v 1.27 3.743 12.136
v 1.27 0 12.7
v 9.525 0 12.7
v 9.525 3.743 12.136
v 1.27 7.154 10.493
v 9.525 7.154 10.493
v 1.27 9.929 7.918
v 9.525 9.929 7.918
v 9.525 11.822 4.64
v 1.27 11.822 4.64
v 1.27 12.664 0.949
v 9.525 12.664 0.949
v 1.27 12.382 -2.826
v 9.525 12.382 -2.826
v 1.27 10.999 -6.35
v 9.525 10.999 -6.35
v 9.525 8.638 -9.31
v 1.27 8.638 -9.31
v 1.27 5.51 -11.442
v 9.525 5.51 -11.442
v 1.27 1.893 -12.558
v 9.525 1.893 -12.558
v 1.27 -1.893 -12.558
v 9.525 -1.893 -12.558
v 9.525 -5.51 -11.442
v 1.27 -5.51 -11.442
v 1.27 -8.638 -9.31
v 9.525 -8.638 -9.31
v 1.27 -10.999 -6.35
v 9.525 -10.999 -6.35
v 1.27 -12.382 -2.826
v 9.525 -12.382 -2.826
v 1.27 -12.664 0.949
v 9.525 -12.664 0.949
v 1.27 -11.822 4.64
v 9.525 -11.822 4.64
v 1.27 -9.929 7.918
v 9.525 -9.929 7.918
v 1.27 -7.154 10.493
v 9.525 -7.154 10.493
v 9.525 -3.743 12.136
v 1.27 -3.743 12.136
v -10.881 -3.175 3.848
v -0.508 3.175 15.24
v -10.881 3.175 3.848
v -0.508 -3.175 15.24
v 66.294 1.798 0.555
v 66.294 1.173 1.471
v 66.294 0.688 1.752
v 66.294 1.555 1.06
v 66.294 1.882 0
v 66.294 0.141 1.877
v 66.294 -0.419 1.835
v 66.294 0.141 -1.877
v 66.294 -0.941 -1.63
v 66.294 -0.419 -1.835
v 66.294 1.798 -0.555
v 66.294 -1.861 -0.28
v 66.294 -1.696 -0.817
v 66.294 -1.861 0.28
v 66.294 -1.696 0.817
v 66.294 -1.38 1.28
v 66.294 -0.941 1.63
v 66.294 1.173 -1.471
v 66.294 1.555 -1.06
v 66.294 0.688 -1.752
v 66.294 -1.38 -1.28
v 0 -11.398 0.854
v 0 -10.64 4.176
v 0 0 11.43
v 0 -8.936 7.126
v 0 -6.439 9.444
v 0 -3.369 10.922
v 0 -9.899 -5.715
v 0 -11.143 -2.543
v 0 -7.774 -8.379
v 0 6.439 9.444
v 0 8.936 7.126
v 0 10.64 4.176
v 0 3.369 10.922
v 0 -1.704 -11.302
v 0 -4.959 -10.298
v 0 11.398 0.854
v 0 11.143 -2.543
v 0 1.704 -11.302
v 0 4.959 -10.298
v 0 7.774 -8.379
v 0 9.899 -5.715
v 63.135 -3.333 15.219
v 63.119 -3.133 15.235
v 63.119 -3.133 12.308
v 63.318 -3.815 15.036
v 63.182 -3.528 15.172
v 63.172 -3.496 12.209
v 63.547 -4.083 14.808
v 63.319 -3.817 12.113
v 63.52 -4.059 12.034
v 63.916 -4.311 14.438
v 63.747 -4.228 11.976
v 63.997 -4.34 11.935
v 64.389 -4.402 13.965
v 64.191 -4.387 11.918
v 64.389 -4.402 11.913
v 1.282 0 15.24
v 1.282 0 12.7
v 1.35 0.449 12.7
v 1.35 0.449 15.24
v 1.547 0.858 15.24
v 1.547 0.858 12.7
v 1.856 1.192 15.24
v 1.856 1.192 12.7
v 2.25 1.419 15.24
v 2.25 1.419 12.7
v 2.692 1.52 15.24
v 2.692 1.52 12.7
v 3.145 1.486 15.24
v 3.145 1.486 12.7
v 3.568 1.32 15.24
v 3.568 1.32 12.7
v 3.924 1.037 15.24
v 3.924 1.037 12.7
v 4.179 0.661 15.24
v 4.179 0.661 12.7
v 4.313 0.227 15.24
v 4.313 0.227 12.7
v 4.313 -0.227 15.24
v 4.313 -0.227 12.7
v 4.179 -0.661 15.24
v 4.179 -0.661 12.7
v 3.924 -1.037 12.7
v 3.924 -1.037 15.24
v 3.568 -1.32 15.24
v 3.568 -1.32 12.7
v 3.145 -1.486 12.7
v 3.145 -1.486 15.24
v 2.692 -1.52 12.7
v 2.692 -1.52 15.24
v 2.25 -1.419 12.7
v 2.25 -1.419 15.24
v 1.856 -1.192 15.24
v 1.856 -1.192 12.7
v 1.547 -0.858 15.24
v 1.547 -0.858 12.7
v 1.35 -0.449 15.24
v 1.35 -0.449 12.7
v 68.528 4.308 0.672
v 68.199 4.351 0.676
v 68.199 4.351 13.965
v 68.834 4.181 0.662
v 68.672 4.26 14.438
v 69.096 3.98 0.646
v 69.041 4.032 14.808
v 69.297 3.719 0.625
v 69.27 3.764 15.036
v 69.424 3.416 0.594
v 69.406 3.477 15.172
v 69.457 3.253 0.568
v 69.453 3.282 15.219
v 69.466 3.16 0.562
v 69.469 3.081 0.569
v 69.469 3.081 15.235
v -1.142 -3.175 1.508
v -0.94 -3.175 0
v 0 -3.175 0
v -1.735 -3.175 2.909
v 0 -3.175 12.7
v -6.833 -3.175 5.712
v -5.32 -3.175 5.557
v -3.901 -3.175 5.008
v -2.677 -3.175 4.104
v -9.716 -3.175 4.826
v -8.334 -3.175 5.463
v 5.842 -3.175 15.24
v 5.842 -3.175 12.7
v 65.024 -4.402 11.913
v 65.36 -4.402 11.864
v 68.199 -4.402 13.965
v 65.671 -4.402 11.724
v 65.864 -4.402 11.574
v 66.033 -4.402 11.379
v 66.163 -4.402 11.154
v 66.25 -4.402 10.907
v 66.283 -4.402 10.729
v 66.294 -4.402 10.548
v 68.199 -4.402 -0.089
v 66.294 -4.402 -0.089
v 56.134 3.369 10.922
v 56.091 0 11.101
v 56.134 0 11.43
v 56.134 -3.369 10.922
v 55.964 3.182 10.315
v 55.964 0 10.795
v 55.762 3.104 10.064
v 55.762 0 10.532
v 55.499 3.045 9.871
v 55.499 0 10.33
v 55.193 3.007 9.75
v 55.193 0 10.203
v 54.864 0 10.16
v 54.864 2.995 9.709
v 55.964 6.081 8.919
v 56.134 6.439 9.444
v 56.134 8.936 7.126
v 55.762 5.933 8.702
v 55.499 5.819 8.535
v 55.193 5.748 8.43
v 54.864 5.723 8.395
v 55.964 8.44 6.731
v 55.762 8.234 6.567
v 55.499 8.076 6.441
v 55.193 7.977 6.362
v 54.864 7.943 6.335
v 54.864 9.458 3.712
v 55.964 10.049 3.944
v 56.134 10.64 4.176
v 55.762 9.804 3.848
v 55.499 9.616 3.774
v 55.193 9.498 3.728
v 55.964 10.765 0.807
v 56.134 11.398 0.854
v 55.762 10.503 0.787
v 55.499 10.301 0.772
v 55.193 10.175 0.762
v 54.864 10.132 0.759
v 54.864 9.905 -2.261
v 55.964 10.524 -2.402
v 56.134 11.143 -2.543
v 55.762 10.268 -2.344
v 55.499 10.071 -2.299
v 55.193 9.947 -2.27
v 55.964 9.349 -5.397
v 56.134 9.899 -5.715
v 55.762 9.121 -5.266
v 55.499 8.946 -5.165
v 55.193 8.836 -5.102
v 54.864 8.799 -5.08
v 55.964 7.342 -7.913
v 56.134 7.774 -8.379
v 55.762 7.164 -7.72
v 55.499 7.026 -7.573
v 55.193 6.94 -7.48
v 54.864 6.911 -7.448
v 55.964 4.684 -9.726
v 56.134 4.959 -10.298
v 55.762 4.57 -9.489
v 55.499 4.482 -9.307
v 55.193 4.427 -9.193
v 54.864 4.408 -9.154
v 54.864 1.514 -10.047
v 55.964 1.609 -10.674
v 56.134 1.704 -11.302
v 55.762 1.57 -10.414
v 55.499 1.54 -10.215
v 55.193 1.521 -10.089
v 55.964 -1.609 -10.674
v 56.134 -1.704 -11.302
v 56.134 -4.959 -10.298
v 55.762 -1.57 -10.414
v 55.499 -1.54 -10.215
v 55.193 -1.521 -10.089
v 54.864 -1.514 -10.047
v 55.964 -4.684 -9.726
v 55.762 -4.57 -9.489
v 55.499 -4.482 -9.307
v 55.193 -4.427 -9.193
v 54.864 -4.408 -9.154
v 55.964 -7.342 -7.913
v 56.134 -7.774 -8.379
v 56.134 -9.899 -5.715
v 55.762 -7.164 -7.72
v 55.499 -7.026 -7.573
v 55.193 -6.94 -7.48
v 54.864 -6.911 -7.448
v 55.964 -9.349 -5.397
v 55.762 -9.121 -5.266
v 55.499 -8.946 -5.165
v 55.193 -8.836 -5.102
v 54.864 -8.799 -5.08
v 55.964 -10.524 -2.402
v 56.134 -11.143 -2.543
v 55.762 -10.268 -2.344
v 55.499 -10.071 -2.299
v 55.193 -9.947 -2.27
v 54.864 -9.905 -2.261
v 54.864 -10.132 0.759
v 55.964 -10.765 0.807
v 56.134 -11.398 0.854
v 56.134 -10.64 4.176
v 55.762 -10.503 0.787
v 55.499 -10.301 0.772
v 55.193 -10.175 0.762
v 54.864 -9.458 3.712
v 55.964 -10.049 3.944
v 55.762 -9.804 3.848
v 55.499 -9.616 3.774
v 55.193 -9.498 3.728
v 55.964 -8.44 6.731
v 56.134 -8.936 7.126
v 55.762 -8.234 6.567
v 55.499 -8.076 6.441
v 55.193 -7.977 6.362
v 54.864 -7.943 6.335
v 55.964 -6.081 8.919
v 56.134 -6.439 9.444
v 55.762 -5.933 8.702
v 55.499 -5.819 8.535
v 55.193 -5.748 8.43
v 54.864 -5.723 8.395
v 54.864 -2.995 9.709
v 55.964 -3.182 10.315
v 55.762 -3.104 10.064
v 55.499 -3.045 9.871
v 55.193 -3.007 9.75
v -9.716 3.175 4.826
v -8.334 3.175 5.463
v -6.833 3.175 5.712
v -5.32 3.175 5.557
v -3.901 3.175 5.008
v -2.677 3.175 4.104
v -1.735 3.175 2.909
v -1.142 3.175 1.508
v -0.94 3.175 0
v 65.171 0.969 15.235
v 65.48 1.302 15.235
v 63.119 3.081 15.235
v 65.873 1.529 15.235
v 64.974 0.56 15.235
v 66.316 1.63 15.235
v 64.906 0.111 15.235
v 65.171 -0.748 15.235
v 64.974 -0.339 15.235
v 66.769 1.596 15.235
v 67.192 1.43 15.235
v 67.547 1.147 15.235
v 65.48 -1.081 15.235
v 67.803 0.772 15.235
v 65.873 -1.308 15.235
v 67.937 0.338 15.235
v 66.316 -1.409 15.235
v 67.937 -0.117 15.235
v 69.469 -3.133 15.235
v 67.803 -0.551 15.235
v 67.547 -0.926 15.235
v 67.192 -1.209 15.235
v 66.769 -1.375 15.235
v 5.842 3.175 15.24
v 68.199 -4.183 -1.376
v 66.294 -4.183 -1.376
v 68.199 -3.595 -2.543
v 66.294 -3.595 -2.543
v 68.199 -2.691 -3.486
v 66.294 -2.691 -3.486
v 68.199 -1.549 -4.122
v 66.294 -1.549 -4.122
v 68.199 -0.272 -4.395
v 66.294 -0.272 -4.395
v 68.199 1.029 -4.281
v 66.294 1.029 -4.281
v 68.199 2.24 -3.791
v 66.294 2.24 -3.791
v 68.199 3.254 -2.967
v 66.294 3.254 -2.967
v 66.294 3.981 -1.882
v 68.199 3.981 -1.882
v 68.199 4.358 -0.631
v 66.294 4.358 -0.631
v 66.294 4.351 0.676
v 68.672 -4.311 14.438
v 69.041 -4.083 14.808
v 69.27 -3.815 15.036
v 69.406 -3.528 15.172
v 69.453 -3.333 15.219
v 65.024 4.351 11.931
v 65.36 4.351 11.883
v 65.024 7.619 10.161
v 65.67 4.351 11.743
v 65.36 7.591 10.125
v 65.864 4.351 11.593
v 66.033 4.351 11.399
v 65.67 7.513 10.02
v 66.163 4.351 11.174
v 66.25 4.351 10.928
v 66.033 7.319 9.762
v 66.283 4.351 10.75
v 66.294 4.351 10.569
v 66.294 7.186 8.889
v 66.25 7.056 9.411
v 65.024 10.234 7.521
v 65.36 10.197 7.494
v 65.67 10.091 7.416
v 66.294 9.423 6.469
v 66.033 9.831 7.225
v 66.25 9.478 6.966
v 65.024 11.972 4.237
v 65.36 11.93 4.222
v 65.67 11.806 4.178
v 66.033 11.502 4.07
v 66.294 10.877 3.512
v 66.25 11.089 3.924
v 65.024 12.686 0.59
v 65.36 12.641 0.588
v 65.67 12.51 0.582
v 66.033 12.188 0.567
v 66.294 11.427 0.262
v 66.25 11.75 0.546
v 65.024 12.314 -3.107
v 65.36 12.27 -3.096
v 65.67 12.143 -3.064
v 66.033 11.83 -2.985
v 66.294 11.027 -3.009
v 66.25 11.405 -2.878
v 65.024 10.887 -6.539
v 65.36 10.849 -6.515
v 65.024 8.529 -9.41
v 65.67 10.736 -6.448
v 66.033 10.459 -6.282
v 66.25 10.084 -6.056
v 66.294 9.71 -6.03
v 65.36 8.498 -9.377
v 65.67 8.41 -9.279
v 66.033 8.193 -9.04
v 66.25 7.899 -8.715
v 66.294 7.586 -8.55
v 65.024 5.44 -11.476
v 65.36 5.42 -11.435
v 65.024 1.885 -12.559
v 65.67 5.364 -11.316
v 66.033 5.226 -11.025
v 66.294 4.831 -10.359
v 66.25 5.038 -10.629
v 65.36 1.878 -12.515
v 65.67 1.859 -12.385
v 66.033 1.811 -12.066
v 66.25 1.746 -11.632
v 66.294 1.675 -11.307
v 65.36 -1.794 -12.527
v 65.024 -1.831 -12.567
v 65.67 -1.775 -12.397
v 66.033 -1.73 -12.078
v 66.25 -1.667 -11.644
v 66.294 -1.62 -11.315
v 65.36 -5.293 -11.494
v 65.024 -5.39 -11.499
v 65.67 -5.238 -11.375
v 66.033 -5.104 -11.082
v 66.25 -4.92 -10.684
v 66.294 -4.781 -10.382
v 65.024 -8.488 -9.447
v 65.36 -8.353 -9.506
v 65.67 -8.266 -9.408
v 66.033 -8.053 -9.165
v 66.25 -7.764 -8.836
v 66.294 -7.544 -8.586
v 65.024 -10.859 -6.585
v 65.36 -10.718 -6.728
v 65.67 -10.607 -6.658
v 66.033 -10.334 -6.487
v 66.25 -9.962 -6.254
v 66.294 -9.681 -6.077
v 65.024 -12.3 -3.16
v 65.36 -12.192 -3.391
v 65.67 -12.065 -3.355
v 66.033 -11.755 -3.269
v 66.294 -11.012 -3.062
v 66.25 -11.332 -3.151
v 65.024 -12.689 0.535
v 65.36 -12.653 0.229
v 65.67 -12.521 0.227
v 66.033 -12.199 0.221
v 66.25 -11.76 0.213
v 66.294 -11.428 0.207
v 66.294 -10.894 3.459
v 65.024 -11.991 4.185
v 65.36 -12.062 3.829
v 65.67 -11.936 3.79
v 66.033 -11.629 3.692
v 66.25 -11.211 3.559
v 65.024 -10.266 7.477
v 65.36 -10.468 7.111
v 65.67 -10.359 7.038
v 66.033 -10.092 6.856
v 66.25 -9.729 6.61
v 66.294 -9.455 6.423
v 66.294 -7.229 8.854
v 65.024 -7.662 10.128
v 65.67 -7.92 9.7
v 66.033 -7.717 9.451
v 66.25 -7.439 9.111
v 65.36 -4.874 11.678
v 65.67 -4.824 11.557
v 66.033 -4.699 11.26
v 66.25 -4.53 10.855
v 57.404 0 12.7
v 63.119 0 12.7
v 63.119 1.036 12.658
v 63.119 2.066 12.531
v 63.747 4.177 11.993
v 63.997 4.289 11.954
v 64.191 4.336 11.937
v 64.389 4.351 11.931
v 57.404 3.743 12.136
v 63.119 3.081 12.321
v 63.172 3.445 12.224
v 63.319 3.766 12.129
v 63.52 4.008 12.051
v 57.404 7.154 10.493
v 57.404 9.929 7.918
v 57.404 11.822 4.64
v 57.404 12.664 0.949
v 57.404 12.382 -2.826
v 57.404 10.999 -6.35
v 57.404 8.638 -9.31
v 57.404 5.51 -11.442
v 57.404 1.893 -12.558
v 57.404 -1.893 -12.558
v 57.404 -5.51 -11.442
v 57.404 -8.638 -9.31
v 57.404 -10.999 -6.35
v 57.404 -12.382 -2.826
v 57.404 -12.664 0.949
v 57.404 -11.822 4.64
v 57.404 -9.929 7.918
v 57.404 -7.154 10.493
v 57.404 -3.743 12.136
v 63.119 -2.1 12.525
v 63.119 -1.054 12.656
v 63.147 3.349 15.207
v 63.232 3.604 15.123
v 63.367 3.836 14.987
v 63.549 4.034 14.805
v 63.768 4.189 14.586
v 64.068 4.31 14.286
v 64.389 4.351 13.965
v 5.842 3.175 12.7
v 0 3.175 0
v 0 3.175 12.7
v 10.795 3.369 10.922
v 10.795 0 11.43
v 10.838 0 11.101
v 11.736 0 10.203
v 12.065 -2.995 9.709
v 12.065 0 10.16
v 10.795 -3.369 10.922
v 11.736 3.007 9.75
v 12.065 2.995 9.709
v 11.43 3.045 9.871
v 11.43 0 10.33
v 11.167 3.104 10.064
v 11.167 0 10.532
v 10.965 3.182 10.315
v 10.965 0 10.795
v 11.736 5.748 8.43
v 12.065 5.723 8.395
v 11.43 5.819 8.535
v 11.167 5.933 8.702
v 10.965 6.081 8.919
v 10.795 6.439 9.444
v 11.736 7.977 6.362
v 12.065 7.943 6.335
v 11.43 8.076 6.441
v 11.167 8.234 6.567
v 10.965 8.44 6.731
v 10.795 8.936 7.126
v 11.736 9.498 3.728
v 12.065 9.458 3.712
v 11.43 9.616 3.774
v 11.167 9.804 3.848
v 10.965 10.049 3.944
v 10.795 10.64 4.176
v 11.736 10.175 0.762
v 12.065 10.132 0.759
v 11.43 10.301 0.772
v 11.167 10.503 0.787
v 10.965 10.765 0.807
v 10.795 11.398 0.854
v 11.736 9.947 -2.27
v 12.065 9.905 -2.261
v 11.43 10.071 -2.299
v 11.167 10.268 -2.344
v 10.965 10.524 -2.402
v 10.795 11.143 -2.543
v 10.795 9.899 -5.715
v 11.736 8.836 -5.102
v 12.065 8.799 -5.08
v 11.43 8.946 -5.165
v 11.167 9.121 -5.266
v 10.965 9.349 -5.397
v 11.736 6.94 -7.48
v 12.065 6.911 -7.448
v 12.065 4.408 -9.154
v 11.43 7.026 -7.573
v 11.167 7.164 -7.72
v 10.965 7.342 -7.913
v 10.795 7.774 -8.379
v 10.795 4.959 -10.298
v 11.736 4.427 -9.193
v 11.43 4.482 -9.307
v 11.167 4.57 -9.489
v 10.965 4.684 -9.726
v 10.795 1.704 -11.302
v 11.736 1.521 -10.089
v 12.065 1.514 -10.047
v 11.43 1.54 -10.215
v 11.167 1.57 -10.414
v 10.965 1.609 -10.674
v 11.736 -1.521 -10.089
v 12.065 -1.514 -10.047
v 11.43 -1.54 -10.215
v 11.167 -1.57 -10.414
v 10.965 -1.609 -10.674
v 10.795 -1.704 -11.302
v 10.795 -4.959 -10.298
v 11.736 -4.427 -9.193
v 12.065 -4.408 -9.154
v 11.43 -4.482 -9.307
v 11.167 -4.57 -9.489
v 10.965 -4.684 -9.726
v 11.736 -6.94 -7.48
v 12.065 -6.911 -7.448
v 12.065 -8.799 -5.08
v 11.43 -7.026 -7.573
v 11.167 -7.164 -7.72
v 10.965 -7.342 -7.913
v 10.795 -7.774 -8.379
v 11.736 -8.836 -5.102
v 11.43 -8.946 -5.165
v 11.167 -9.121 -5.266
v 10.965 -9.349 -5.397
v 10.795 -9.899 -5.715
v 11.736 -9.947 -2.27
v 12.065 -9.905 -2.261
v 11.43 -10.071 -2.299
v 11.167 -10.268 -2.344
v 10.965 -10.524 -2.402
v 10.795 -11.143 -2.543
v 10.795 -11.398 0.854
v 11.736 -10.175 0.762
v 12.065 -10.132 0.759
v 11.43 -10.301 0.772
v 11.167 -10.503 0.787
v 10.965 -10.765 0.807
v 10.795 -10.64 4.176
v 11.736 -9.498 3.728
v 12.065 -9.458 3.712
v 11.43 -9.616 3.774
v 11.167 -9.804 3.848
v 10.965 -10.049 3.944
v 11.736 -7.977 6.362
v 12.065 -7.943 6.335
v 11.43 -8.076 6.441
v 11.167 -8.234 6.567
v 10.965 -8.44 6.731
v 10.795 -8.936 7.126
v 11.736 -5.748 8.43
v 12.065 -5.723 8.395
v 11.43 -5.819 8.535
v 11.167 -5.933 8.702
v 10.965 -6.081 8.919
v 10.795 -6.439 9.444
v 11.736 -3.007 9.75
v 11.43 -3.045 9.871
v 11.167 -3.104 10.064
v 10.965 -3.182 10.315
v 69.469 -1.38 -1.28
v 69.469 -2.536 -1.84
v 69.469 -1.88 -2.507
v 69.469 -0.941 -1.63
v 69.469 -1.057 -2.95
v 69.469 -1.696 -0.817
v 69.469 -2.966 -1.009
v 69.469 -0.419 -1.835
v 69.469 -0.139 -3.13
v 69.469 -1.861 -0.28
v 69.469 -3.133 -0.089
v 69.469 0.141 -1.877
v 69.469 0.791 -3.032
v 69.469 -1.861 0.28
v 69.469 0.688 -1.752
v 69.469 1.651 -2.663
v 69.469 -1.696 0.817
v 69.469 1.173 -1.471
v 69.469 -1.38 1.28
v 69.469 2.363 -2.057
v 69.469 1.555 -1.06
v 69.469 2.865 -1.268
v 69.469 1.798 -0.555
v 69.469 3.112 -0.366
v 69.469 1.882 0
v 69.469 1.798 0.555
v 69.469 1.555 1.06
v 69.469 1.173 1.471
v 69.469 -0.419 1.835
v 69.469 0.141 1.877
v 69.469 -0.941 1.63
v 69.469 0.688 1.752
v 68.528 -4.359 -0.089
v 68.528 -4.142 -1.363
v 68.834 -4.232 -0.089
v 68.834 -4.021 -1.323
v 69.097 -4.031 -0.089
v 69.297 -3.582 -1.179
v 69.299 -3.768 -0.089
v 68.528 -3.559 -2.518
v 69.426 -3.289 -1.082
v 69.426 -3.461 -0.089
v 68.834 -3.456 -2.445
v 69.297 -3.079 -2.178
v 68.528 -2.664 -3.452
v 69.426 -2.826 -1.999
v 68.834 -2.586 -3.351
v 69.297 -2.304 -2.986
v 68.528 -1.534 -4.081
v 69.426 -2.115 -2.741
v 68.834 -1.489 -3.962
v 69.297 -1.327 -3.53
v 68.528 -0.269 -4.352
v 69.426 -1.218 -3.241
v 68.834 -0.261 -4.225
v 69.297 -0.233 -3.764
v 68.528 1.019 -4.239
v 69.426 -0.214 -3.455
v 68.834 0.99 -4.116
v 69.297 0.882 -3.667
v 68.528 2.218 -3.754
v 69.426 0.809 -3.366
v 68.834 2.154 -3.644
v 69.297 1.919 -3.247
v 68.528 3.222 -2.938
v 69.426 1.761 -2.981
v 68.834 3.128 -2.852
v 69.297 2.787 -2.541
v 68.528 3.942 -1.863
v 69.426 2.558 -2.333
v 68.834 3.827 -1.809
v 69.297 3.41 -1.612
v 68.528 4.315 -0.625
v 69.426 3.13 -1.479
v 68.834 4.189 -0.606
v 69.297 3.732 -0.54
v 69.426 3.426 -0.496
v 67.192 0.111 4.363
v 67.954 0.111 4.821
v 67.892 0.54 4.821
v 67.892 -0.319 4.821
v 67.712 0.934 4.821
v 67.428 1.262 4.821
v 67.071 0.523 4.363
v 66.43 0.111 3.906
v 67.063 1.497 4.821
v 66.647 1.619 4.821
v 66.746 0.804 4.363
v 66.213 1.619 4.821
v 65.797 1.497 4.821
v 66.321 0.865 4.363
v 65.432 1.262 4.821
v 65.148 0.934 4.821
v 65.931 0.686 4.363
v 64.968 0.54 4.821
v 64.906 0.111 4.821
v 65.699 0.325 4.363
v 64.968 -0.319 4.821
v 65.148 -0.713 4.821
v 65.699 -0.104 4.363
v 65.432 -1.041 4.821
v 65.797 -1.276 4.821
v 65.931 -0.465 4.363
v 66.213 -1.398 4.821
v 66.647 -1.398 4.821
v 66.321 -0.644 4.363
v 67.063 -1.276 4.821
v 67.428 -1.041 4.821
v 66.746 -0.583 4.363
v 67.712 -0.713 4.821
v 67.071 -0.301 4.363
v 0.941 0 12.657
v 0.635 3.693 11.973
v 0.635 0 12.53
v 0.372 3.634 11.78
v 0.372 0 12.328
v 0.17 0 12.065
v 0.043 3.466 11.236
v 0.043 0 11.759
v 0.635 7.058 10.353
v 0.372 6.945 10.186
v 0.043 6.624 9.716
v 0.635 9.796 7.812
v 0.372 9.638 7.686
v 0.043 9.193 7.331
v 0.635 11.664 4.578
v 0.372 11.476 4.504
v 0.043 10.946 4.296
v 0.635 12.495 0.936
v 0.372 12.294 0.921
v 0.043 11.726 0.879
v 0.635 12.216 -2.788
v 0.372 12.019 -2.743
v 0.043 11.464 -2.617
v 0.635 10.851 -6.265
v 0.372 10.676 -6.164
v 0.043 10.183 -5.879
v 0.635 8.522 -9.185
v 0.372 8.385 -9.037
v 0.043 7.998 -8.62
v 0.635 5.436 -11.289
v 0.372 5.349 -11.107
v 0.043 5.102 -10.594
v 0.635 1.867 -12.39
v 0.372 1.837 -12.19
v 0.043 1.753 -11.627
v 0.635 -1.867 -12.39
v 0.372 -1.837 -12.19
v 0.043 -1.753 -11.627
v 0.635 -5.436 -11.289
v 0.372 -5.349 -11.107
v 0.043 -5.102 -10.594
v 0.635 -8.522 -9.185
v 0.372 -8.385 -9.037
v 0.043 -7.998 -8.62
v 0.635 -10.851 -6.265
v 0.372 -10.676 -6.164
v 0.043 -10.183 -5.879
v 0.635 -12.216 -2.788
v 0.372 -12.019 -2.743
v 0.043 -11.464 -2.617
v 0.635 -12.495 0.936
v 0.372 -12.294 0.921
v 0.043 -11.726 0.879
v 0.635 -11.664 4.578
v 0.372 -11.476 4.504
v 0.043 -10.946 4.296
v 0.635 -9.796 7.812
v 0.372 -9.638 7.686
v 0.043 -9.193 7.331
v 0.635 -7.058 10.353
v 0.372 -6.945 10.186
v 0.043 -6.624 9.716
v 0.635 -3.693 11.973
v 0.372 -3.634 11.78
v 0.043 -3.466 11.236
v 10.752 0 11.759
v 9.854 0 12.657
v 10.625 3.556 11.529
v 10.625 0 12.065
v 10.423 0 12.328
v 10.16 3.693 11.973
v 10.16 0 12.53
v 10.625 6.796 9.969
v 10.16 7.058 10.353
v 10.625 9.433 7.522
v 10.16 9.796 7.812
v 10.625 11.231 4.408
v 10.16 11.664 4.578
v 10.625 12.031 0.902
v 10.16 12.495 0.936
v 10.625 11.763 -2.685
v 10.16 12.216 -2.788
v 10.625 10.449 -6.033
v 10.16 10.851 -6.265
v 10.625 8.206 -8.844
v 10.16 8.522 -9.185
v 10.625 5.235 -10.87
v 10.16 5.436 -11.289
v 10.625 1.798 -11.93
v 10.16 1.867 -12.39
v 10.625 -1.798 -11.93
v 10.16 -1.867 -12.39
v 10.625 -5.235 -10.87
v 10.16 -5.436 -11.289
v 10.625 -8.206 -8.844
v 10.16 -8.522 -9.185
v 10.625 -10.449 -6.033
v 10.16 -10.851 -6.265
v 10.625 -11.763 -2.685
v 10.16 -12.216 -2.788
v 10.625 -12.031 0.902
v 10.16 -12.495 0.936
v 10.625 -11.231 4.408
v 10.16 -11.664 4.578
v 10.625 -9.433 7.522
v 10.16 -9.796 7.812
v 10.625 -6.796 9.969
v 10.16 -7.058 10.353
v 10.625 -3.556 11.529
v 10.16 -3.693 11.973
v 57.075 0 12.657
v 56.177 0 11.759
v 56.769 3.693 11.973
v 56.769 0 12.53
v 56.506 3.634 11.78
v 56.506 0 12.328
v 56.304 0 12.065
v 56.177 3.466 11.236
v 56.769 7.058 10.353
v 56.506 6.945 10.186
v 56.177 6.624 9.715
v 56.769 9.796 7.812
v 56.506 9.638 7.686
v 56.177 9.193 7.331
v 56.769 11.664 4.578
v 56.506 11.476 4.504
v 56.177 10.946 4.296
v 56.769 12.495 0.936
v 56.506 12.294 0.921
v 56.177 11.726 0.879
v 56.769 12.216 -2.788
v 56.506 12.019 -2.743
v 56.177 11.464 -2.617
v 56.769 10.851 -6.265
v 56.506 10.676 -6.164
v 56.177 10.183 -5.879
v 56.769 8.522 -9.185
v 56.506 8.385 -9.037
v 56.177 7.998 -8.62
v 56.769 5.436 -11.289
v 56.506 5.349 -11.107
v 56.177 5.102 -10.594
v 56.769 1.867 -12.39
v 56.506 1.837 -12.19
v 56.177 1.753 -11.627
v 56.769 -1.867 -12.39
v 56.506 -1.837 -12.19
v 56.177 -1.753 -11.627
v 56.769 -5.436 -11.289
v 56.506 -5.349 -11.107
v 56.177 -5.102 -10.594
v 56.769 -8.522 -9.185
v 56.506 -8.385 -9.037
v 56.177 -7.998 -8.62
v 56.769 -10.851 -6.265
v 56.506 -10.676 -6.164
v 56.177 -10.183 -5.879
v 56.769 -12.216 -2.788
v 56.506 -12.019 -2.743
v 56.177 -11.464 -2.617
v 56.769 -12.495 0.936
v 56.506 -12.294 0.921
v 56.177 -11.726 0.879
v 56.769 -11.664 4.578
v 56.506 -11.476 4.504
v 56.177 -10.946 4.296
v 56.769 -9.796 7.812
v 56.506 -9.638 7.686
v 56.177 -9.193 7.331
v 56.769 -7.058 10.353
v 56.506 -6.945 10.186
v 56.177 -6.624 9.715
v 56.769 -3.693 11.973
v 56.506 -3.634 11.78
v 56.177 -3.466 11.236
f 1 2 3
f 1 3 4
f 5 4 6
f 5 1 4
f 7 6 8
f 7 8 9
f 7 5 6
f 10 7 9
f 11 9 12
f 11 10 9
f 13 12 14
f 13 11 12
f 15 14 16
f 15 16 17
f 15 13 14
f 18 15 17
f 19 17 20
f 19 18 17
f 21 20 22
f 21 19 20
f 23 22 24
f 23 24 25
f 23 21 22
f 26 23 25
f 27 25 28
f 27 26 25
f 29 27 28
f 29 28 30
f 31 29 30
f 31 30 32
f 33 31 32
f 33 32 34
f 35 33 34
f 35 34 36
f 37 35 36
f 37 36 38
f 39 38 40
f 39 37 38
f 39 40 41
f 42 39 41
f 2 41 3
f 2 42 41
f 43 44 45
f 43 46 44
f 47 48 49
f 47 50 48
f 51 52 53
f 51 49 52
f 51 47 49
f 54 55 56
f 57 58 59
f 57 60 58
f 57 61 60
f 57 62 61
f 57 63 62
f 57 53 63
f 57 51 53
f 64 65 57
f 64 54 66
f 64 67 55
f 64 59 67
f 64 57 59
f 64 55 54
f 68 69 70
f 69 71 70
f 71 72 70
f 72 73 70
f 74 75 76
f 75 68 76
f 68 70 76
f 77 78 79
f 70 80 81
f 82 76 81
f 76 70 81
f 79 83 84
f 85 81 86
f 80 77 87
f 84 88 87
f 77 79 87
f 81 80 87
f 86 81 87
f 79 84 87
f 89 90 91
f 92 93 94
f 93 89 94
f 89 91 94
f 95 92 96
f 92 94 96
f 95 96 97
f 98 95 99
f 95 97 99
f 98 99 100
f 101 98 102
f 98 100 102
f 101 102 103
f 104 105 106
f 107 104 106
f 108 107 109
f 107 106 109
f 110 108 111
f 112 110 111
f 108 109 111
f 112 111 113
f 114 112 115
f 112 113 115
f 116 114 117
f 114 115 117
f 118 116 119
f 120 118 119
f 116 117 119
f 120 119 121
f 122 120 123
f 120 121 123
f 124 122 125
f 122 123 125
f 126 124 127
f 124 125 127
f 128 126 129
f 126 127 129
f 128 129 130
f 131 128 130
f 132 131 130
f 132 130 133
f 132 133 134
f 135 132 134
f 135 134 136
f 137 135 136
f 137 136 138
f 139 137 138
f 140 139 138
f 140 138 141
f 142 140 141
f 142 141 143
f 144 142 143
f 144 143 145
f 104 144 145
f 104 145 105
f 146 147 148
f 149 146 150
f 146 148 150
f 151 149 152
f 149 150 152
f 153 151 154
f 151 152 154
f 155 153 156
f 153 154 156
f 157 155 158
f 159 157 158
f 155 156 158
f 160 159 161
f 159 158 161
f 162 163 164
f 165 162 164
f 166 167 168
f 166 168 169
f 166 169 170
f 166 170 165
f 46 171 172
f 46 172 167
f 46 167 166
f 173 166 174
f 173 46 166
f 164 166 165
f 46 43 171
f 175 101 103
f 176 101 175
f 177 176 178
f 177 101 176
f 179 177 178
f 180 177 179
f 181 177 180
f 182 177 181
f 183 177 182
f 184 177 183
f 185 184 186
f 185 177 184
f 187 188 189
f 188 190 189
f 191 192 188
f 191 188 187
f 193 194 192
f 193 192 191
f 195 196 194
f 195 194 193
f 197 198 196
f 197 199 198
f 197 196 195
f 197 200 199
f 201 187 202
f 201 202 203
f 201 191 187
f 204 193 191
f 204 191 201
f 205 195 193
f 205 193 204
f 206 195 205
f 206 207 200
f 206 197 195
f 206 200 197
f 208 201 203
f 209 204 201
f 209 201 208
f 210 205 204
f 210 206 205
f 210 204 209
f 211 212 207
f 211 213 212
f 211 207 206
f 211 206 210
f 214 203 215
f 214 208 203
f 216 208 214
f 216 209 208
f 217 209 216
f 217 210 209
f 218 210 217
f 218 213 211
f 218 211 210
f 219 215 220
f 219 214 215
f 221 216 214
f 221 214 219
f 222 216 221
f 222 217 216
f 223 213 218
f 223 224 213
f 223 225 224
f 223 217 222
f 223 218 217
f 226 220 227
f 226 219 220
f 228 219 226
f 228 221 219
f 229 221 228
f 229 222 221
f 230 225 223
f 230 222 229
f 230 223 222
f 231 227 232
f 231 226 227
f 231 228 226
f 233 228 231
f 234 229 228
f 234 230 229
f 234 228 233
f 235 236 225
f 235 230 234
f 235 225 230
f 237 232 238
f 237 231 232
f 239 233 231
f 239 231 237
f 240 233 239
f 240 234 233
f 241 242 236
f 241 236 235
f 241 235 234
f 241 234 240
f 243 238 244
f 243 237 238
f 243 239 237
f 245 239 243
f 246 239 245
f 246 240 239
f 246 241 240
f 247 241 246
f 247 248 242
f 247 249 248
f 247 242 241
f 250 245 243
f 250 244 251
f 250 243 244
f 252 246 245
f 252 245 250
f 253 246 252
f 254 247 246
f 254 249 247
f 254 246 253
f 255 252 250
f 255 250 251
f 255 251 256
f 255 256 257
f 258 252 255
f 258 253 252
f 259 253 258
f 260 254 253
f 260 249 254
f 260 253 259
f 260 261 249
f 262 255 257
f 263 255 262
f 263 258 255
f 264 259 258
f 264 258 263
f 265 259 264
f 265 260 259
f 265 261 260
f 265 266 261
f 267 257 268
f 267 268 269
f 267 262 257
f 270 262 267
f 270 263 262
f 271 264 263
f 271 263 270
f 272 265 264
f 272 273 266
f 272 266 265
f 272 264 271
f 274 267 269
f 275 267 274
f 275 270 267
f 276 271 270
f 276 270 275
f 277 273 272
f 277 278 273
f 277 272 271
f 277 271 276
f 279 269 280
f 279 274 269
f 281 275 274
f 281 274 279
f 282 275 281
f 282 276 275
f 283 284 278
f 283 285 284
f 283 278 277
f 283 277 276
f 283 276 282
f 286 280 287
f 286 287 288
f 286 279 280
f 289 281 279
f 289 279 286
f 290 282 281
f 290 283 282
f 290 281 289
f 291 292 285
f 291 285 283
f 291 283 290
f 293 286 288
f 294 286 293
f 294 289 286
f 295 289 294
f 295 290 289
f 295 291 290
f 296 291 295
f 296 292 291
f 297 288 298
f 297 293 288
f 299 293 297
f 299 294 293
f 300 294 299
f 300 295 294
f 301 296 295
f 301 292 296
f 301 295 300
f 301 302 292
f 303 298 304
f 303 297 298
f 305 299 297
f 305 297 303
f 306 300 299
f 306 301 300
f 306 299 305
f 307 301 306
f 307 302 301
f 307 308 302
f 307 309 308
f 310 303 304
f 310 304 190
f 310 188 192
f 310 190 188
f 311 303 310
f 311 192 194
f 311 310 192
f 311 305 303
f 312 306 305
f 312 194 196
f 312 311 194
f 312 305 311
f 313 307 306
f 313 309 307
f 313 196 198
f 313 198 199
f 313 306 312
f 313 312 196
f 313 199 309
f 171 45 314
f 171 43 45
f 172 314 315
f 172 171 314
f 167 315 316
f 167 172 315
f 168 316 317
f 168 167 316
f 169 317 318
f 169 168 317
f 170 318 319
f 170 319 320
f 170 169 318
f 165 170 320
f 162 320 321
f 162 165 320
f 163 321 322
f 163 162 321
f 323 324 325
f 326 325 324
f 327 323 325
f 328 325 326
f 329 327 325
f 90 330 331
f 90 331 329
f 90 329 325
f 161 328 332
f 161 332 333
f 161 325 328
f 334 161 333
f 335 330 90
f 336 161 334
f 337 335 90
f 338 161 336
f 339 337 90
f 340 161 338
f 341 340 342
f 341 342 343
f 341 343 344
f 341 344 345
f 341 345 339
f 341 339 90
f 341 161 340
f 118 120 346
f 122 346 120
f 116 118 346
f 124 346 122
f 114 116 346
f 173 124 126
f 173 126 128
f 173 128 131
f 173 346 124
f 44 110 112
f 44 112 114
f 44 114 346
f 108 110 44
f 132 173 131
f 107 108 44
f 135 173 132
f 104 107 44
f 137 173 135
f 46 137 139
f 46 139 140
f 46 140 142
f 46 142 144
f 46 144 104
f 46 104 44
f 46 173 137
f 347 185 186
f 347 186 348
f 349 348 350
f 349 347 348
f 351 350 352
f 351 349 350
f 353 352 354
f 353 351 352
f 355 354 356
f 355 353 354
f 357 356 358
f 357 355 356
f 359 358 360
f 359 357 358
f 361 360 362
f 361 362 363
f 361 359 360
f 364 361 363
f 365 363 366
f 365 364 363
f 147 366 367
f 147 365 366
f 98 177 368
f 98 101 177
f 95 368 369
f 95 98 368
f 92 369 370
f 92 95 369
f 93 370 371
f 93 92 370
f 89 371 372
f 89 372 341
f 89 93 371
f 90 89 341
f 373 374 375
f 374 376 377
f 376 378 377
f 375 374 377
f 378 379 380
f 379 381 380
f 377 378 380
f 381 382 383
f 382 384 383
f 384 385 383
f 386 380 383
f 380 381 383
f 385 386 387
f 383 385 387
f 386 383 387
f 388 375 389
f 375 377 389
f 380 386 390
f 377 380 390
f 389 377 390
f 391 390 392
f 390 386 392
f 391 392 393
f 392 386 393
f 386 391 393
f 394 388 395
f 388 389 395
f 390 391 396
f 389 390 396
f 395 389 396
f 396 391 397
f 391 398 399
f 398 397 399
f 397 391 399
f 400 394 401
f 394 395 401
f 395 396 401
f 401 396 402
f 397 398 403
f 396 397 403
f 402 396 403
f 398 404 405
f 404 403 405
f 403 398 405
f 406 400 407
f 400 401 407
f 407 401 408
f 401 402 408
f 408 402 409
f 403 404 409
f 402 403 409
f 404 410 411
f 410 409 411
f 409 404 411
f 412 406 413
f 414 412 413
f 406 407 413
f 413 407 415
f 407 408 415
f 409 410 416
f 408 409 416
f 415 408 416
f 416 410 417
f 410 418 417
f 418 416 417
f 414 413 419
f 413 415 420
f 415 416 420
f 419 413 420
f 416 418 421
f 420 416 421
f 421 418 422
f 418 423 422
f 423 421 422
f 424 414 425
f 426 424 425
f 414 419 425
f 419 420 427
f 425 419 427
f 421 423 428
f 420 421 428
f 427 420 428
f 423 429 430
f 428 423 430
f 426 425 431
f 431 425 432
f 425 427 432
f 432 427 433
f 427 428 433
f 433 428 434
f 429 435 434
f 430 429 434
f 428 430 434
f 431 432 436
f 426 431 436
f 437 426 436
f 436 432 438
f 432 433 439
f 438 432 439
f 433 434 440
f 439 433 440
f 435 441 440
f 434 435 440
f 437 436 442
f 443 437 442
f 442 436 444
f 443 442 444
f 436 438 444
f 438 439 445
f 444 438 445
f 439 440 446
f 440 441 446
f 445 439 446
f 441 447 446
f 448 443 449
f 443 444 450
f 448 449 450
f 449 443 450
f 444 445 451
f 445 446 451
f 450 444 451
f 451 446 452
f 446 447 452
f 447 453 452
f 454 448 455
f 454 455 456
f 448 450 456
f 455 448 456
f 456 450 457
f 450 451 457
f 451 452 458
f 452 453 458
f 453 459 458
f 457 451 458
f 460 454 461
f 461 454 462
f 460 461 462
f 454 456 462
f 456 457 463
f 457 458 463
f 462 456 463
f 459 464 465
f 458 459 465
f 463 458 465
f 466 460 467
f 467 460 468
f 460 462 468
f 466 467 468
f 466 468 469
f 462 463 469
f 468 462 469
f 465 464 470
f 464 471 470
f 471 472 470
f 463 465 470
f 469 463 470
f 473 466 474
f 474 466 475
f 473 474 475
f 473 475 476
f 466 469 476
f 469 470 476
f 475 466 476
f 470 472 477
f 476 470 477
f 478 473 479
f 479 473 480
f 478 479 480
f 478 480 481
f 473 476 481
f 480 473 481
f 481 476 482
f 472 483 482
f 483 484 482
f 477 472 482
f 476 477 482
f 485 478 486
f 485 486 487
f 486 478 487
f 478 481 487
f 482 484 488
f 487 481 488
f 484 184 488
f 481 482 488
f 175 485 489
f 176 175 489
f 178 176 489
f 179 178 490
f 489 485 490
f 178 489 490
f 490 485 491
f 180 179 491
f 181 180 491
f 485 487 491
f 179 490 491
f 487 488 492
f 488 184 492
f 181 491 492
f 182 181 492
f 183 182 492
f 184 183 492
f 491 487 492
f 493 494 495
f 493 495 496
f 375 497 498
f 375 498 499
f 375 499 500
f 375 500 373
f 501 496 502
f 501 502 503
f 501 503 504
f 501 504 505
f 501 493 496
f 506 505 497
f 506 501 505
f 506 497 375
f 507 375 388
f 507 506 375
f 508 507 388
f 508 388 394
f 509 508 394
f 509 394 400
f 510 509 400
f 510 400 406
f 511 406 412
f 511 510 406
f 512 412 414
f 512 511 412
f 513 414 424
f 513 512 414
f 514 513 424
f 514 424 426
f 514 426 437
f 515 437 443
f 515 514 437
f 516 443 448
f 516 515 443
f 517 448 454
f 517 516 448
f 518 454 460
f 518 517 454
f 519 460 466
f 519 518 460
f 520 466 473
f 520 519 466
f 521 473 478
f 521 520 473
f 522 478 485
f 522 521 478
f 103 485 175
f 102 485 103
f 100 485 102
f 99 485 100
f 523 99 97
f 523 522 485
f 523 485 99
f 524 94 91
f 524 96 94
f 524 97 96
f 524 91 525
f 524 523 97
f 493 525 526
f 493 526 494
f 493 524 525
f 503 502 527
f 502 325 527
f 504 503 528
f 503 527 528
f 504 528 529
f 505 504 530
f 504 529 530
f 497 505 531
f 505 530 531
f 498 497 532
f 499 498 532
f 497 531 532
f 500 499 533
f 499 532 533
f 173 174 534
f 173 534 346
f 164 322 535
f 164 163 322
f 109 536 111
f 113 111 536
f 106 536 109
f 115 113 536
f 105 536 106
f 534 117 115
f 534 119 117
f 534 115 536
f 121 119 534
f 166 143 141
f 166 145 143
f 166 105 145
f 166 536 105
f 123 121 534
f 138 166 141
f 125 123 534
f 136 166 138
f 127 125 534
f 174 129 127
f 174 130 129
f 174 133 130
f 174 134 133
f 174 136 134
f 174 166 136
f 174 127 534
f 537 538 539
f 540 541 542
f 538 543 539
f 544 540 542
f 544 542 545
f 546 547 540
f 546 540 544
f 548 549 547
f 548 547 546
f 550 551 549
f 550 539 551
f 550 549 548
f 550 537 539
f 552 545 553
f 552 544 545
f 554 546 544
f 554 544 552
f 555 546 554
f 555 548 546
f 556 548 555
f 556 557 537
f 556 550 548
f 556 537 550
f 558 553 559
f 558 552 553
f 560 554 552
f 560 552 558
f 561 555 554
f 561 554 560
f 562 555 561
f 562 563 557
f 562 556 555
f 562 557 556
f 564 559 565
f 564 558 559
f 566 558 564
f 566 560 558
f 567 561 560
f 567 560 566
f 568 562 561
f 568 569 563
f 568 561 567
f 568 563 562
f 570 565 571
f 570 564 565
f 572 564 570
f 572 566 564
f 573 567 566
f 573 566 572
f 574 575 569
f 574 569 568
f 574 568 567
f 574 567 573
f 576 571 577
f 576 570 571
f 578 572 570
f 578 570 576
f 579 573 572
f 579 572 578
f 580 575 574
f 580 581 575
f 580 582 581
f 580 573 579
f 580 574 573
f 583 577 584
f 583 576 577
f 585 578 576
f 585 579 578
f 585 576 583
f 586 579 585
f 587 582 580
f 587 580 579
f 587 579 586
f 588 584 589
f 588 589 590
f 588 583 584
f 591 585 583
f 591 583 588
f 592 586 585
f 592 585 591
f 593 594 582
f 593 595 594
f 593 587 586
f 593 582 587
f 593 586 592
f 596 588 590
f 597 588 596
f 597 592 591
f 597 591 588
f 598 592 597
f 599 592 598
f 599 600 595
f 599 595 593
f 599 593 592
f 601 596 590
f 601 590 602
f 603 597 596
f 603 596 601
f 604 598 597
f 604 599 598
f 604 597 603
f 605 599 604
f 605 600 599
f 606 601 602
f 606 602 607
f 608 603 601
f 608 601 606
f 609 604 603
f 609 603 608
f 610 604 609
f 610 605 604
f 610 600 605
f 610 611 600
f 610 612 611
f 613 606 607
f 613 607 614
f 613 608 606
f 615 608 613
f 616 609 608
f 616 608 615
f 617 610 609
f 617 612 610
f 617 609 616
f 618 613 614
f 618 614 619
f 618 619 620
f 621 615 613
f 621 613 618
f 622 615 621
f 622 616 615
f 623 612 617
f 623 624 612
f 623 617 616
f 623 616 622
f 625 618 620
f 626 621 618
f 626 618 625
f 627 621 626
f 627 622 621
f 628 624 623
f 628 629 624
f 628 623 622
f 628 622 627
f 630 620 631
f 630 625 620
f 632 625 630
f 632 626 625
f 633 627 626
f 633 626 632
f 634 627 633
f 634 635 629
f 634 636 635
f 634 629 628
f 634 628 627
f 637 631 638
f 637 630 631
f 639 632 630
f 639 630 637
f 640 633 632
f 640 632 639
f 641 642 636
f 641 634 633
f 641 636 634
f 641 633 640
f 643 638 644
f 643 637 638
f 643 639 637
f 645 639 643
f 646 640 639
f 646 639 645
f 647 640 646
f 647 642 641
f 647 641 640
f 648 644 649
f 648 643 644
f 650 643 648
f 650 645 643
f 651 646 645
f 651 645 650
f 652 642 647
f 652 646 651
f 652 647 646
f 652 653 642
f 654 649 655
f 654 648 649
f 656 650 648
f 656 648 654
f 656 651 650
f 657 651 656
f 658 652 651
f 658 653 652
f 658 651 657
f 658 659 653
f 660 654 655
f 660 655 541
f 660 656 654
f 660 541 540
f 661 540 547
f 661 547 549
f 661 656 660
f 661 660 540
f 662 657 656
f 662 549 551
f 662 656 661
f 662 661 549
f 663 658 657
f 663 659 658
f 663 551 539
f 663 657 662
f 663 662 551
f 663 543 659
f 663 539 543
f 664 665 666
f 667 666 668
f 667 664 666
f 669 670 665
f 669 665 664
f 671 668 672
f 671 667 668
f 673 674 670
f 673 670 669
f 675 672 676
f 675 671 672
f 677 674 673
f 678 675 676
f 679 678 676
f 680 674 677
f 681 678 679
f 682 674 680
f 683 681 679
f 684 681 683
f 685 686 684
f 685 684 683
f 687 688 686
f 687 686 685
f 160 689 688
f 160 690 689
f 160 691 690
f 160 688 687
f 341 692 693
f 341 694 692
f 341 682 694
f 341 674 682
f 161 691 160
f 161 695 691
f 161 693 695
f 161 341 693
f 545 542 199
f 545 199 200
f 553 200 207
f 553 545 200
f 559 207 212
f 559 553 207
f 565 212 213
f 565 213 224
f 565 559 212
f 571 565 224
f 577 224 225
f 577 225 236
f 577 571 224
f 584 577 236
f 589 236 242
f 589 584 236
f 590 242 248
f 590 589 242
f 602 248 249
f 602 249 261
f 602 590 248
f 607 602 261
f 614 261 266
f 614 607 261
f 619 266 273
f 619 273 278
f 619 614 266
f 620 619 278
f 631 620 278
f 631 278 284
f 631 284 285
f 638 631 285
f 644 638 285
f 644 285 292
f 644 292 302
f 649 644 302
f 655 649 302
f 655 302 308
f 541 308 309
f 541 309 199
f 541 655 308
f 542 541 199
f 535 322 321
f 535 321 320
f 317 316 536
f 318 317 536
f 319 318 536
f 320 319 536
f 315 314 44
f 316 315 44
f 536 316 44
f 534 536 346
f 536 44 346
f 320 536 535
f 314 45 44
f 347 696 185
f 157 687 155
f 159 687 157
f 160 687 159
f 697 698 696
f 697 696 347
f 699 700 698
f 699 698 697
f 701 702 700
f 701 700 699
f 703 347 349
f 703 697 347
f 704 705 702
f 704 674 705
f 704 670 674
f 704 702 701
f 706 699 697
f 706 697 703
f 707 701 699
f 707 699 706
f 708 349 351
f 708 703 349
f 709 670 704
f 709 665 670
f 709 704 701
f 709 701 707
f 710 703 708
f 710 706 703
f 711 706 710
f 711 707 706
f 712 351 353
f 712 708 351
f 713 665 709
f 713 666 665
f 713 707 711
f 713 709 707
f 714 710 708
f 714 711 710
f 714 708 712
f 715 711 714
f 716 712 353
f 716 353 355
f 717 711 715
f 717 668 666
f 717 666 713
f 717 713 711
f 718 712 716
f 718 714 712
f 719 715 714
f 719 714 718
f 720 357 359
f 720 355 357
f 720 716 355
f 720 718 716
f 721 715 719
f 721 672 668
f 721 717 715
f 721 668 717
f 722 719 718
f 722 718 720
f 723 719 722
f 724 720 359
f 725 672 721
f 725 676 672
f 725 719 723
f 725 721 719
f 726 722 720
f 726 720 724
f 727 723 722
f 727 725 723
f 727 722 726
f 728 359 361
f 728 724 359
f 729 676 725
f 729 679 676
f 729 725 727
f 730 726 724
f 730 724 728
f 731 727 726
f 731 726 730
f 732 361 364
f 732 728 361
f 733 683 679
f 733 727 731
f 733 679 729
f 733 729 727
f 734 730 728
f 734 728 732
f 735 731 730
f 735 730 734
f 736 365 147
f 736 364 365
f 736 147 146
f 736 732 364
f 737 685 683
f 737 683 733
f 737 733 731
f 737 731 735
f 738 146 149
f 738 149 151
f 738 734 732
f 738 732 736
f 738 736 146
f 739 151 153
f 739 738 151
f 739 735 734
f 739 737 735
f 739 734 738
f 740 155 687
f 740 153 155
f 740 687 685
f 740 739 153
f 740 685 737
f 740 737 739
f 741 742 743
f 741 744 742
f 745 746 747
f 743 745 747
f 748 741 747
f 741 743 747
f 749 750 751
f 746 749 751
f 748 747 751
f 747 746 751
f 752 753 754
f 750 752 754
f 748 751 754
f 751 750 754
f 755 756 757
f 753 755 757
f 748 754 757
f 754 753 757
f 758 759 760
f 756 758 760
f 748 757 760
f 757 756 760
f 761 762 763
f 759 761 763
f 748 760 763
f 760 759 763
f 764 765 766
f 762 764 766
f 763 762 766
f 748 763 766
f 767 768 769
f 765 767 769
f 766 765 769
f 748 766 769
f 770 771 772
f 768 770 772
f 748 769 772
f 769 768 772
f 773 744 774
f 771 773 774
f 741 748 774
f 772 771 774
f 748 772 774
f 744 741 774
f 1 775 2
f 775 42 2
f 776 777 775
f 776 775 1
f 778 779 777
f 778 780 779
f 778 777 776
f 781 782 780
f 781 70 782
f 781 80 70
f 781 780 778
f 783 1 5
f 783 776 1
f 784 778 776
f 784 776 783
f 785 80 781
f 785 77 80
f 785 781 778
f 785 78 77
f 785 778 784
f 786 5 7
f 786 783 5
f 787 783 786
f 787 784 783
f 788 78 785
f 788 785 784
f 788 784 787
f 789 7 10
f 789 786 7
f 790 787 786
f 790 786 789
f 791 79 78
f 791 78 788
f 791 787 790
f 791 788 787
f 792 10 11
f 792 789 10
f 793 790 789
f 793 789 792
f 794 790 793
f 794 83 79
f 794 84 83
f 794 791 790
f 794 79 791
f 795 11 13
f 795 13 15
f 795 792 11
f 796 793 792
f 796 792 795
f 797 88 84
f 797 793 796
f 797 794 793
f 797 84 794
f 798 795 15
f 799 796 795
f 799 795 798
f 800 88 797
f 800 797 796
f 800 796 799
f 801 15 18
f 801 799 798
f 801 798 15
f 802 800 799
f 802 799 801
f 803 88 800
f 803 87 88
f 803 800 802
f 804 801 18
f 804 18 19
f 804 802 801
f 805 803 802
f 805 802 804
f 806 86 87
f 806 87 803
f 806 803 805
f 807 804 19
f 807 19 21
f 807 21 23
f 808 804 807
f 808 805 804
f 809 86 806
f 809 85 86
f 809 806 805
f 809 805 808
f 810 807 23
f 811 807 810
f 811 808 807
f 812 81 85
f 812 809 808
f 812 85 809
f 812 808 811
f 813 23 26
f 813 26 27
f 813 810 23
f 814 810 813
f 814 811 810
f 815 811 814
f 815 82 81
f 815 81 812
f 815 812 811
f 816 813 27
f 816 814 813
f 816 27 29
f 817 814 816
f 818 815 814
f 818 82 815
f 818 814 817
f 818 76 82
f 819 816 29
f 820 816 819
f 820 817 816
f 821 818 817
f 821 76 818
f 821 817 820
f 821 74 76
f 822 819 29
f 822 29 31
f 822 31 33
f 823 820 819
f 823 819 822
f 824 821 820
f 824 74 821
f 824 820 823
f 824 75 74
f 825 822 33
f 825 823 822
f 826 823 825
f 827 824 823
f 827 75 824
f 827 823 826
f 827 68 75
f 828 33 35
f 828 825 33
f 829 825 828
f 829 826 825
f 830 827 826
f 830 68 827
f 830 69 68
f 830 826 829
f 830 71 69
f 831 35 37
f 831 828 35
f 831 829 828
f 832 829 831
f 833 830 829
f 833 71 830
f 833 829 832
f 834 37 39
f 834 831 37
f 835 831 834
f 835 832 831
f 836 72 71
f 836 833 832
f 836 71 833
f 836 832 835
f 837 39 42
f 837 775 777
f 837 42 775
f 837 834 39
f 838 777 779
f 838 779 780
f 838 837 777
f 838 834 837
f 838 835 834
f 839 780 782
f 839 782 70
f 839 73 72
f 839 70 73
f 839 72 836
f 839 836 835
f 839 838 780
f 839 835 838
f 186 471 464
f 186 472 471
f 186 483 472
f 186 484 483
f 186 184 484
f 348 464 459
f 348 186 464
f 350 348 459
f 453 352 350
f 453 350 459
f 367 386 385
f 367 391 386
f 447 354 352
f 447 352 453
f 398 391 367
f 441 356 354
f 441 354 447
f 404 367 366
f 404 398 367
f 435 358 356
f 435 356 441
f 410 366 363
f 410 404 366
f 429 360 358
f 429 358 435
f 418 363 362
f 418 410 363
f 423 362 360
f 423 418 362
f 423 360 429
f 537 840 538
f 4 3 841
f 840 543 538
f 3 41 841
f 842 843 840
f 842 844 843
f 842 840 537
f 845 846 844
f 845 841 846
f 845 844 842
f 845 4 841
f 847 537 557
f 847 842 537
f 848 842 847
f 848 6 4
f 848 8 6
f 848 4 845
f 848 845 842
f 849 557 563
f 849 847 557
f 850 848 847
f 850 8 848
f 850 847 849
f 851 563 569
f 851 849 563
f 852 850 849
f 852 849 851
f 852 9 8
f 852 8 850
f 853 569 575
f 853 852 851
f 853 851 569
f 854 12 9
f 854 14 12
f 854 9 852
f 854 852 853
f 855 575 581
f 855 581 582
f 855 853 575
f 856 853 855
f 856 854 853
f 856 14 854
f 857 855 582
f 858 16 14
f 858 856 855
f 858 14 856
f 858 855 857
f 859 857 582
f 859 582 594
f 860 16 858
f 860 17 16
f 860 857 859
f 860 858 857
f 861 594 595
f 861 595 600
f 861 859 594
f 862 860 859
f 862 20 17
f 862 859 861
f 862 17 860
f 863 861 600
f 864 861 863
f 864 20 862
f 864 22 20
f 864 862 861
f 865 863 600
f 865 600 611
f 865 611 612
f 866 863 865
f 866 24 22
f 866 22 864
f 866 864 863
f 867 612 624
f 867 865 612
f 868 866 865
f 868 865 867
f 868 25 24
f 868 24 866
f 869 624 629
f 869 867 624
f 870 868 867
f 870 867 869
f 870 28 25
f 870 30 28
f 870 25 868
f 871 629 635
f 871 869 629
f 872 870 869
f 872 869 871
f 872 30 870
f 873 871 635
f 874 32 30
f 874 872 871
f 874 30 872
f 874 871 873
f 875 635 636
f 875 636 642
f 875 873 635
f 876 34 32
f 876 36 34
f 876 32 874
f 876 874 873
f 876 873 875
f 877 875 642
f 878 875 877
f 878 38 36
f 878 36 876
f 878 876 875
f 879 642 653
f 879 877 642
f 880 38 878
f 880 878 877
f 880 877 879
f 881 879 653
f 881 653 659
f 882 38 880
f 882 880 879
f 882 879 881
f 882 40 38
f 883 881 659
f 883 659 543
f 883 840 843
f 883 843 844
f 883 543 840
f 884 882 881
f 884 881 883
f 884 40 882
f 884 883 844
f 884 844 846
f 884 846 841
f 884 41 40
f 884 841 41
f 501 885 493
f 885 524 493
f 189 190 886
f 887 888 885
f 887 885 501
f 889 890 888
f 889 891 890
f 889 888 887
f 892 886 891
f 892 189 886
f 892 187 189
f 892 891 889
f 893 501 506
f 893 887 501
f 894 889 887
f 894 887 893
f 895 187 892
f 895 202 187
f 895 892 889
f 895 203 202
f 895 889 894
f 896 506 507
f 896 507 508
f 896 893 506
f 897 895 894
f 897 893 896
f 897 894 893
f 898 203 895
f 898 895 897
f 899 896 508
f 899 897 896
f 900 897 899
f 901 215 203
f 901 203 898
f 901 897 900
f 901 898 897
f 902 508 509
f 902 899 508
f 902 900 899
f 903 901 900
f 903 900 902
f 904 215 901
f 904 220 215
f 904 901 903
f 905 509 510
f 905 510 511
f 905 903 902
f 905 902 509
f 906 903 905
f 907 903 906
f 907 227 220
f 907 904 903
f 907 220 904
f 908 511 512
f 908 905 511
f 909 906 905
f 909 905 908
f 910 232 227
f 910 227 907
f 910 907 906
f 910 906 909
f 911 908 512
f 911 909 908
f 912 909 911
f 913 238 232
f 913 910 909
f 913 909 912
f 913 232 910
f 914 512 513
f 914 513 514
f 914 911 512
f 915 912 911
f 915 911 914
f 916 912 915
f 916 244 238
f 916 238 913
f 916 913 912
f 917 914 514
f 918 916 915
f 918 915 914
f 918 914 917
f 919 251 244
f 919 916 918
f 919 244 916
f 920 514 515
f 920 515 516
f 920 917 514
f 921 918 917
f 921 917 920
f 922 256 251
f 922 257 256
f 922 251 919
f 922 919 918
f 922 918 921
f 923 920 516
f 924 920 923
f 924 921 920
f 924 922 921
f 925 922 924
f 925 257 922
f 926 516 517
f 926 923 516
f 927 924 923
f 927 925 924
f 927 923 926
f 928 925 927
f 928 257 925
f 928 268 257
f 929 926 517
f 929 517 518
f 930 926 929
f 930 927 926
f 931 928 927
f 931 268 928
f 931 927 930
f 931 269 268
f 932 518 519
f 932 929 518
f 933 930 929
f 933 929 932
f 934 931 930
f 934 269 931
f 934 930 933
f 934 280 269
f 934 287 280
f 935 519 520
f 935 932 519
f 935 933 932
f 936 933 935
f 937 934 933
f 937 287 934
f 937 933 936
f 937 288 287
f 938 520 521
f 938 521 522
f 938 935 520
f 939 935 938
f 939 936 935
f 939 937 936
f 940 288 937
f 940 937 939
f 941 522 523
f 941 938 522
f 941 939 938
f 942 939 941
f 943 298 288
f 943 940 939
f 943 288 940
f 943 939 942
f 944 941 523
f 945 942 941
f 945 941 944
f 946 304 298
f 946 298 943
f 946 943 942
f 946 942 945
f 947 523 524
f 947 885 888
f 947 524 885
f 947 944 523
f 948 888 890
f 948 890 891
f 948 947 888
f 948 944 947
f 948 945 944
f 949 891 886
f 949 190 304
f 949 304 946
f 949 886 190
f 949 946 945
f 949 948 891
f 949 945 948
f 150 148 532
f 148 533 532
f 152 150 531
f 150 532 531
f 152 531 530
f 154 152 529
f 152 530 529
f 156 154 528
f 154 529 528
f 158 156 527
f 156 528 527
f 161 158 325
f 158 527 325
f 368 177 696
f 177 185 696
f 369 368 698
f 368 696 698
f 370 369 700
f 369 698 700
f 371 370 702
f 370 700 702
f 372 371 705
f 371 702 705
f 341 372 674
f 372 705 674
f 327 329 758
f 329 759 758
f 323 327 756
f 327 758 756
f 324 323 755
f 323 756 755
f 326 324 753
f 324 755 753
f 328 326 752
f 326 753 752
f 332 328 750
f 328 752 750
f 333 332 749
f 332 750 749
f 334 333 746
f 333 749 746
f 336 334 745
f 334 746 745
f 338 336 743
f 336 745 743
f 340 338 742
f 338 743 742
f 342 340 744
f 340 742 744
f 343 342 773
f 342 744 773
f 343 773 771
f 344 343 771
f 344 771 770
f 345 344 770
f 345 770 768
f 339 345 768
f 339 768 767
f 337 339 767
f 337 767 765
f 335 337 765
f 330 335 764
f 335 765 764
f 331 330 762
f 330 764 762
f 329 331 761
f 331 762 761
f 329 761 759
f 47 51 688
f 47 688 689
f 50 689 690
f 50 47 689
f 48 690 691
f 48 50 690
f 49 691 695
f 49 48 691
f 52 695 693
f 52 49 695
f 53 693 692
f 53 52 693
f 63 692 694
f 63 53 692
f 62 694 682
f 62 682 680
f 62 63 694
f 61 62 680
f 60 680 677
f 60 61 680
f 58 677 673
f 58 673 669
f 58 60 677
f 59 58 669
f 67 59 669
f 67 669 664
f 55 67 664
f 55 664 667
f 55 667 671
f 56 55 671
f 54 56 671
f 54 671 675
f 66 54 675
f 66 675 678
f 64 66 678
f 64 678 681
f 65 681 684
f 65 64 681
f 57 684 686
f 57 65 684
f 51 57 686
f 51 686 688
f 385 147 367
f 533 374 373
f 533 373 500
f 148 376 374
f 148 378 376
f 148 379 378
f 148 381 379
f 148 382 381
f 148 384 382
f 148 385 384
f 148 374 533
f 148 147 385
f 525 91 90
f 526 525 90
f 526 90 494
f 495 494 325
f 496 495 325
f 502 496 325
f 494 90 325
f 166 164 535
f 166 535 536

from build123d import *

# Parameters (mm, degrees)
F0_W     = 5.842
F0_H     = 12.7
F2_DEPTH = 3.175
F3_DEPTH = 0.635
F5_D     = 3.048
F5_DEPTH = 17.78
F5_TIP   = 0.9157115834
F6_R     = 1.8819905546
F7_DEPTH = 3.175
F9_D     = 3.048
F9_DEPTH = 10.414
F9_TIP   = 0.9157115834
F10_R    = 1.27
F11_R    = 1.26999


# Not quite as in the source:
# - two fillets or chamfers of one size are made in one step
# - a fillet or chamfer is up to 0.001 mm smaller than in the source, because OpenCascade refuses the exact size
# - a feature of the source that left no trace in its solid (it failed there, or was rolled back) is left out


with BuildPart() as f1:
    # F0 (on Front) → F1 (revolve)
    with BuildSketch(Plane.XZ):
        Polygon((5.842, 12.7), (5.842, 0), (66.294, 0), (66.294, 12.7), (56.134, 12.7), (56.134, 10.16), (10.16, 10.16), (10.16, 12.7), align=None)
        with Locations((2.921, 6.35)):
            Rectangle(F0_W, F0_H)
    revolve(axis=Axis((33.147, 0, 0), (-1, 0, 0)))

    # F3 (add, symmetric): a face of the model
    f3_faces = [f1.faces().sort_by_distance(p)[0] for p in [
        (10.16, 0, -10.5192102448),
    ]]
    extrude(f3_faces, amount=F3_DEPTH, both=True)

    # F6 (on face) → F7 (join, symmetric)
    with BuildSketch(Plane.YZ.offset(66.294)):
        with BuildLine():
            Line((-4.4024969223, 15.2352917939), (-4.4024969223, 11.9125153032))
            ThreePointArc((-4.4024969223, 11.9125153032), (-0.0272881349, 12.6999706833), (4.3512642127, 11.9313243084))
            Line((4.3512642127, 11.9313243084), (4.3512642127, 15.2352917939))
            Line((4.3512642127, 15.2352917939), (-0.0256163548, 15.2352917939))
            Line((-0.0256163548, 15.2352917939), (-4.4024969223, 15.2352917939))
        make_face()
        with BuildLine():
            Line((-4.4024969223, 11.9125153032), (-4.4024969223, 0.0887250123))
            ThreePointArc((-4.4024969223, 0.0887250123), (-0.2945224047, 4.3935302243), (4.3512642127, 0.6755375863))
            Line((4.3512642127, 0.6755375863), (4.3512642127, 11.9313243084))
            ThreePointArc((4.3512642127, 11.9313243084), (-0.0272881349, 12.6999706833), (-4.4024969223, 11.9125153032))
        make_face()
        with BuildLine():
            Line((-4.4024969223, 0.0887250123), (-4.4024969223, -0.0887250123))
            ThreePointArc((-4.4024969223, -0.0887250123), (0.0443647579, -4.403167388), (4.4033908842, 0))
            ThreePointArc((4.4033908842, 0), (4.3903398756, 0.3387728665), (4.3512642127, 0.6755375863))
            ThreePointArc((4.3512642127, 0.6755375863), (-0.2945224047, 4.3935302243), (-4.4024969223, 0.0887250123))
        make_face()
        Circle(F6_R, mode=Mode.SUBTRACT)
    extrude(amount=F7_DEPTH, both=True)

    # F9
    with Locations(Plane.XY.offset(15.2352917939)):
        with Locations((66.4298757911, 0.1105455449)):
            Hole(F9_D / 2, depth=F9_DEPTH)
            with Locations((0, 0, -(F9_DEPTH + F9_TIP / 2))):  # 118° drill point
                Cone(0, F9_D / 2, F9_TIP, mode=Mode.SUBTRACT)

    # F10
    f10_edges = [f1.edges().sort_by_distance(p)[0] for p in [
        (56.134, 0, -12.7),
    ]]
    fillet(f10_edges, radius=F10_R)

    # F11 (radius 1.27 in the source; OpenCascade refuses exactly that, so slightly less here)
    f11_edges = [f1.edges().sort_by_distance(p)[0] for p in [
        (10.795, 0, -12.7),
        (66.294, -4.402497, 15.235292),
        (63.119, -4.402497, 13.573904),
        (33.4645, 0, 10.16),
        (10.795, 0, -10.16),
        (56.134, 0, -10.16),
        (69.469, -4.402497, 7.573283),
        (66.294, 0.027288, -12.699971),
        (63.119, 4.351264, 13.583308),
        (69.469, 4.351264, 7.955415),
        (66.294, 4.351264, 15.235292),
        (69.469, 0.382989, -4.386704),
        (0, 0, -12.7),
    ]]
    fillet(f11_edges, radius=F11_R)


with BuildPart() as f2:
    # F0 (on Front) → F2 (new body, symmetric)
    with BuildSketch(Plane.XZ):
        with BuildLine():
            Line((-0.9398, 0), (0, 0))
            Line((0, 0), (0, 12.7))
            Line((0, 12.7), (5.842, 12.7))
            Line((5.842, 12.7), (5.842, 15.24))
            Line((5.842, 15.24), (-0.508, 15.24))
            Line((-0.508, 15.24), (-10.8806298187, 3.8475430269))
            ThreePointArc((-10.8806298187, 3.8475430269), (-4.5919612295, 5.3297205562), (-0.9398, 0))
        make_face()
    extrude(amount=F2_DEPTH, both=True)

    # F5
    with Locations(Plane.XY.offset(15.24)):
        with Locations((2.8063759673, 0)):
            Hole(F5_D / 2, depth=F5_DEPTH)
            with Locations((0, 0, -(F5_DEPTH + F5_TIP / 2))):  # 118° drill point
                Cone(0, F5_D / 2, F5_TIP, mode=Mode.SUBTRACT)


solid = Compound([f1.part, f2.part])
